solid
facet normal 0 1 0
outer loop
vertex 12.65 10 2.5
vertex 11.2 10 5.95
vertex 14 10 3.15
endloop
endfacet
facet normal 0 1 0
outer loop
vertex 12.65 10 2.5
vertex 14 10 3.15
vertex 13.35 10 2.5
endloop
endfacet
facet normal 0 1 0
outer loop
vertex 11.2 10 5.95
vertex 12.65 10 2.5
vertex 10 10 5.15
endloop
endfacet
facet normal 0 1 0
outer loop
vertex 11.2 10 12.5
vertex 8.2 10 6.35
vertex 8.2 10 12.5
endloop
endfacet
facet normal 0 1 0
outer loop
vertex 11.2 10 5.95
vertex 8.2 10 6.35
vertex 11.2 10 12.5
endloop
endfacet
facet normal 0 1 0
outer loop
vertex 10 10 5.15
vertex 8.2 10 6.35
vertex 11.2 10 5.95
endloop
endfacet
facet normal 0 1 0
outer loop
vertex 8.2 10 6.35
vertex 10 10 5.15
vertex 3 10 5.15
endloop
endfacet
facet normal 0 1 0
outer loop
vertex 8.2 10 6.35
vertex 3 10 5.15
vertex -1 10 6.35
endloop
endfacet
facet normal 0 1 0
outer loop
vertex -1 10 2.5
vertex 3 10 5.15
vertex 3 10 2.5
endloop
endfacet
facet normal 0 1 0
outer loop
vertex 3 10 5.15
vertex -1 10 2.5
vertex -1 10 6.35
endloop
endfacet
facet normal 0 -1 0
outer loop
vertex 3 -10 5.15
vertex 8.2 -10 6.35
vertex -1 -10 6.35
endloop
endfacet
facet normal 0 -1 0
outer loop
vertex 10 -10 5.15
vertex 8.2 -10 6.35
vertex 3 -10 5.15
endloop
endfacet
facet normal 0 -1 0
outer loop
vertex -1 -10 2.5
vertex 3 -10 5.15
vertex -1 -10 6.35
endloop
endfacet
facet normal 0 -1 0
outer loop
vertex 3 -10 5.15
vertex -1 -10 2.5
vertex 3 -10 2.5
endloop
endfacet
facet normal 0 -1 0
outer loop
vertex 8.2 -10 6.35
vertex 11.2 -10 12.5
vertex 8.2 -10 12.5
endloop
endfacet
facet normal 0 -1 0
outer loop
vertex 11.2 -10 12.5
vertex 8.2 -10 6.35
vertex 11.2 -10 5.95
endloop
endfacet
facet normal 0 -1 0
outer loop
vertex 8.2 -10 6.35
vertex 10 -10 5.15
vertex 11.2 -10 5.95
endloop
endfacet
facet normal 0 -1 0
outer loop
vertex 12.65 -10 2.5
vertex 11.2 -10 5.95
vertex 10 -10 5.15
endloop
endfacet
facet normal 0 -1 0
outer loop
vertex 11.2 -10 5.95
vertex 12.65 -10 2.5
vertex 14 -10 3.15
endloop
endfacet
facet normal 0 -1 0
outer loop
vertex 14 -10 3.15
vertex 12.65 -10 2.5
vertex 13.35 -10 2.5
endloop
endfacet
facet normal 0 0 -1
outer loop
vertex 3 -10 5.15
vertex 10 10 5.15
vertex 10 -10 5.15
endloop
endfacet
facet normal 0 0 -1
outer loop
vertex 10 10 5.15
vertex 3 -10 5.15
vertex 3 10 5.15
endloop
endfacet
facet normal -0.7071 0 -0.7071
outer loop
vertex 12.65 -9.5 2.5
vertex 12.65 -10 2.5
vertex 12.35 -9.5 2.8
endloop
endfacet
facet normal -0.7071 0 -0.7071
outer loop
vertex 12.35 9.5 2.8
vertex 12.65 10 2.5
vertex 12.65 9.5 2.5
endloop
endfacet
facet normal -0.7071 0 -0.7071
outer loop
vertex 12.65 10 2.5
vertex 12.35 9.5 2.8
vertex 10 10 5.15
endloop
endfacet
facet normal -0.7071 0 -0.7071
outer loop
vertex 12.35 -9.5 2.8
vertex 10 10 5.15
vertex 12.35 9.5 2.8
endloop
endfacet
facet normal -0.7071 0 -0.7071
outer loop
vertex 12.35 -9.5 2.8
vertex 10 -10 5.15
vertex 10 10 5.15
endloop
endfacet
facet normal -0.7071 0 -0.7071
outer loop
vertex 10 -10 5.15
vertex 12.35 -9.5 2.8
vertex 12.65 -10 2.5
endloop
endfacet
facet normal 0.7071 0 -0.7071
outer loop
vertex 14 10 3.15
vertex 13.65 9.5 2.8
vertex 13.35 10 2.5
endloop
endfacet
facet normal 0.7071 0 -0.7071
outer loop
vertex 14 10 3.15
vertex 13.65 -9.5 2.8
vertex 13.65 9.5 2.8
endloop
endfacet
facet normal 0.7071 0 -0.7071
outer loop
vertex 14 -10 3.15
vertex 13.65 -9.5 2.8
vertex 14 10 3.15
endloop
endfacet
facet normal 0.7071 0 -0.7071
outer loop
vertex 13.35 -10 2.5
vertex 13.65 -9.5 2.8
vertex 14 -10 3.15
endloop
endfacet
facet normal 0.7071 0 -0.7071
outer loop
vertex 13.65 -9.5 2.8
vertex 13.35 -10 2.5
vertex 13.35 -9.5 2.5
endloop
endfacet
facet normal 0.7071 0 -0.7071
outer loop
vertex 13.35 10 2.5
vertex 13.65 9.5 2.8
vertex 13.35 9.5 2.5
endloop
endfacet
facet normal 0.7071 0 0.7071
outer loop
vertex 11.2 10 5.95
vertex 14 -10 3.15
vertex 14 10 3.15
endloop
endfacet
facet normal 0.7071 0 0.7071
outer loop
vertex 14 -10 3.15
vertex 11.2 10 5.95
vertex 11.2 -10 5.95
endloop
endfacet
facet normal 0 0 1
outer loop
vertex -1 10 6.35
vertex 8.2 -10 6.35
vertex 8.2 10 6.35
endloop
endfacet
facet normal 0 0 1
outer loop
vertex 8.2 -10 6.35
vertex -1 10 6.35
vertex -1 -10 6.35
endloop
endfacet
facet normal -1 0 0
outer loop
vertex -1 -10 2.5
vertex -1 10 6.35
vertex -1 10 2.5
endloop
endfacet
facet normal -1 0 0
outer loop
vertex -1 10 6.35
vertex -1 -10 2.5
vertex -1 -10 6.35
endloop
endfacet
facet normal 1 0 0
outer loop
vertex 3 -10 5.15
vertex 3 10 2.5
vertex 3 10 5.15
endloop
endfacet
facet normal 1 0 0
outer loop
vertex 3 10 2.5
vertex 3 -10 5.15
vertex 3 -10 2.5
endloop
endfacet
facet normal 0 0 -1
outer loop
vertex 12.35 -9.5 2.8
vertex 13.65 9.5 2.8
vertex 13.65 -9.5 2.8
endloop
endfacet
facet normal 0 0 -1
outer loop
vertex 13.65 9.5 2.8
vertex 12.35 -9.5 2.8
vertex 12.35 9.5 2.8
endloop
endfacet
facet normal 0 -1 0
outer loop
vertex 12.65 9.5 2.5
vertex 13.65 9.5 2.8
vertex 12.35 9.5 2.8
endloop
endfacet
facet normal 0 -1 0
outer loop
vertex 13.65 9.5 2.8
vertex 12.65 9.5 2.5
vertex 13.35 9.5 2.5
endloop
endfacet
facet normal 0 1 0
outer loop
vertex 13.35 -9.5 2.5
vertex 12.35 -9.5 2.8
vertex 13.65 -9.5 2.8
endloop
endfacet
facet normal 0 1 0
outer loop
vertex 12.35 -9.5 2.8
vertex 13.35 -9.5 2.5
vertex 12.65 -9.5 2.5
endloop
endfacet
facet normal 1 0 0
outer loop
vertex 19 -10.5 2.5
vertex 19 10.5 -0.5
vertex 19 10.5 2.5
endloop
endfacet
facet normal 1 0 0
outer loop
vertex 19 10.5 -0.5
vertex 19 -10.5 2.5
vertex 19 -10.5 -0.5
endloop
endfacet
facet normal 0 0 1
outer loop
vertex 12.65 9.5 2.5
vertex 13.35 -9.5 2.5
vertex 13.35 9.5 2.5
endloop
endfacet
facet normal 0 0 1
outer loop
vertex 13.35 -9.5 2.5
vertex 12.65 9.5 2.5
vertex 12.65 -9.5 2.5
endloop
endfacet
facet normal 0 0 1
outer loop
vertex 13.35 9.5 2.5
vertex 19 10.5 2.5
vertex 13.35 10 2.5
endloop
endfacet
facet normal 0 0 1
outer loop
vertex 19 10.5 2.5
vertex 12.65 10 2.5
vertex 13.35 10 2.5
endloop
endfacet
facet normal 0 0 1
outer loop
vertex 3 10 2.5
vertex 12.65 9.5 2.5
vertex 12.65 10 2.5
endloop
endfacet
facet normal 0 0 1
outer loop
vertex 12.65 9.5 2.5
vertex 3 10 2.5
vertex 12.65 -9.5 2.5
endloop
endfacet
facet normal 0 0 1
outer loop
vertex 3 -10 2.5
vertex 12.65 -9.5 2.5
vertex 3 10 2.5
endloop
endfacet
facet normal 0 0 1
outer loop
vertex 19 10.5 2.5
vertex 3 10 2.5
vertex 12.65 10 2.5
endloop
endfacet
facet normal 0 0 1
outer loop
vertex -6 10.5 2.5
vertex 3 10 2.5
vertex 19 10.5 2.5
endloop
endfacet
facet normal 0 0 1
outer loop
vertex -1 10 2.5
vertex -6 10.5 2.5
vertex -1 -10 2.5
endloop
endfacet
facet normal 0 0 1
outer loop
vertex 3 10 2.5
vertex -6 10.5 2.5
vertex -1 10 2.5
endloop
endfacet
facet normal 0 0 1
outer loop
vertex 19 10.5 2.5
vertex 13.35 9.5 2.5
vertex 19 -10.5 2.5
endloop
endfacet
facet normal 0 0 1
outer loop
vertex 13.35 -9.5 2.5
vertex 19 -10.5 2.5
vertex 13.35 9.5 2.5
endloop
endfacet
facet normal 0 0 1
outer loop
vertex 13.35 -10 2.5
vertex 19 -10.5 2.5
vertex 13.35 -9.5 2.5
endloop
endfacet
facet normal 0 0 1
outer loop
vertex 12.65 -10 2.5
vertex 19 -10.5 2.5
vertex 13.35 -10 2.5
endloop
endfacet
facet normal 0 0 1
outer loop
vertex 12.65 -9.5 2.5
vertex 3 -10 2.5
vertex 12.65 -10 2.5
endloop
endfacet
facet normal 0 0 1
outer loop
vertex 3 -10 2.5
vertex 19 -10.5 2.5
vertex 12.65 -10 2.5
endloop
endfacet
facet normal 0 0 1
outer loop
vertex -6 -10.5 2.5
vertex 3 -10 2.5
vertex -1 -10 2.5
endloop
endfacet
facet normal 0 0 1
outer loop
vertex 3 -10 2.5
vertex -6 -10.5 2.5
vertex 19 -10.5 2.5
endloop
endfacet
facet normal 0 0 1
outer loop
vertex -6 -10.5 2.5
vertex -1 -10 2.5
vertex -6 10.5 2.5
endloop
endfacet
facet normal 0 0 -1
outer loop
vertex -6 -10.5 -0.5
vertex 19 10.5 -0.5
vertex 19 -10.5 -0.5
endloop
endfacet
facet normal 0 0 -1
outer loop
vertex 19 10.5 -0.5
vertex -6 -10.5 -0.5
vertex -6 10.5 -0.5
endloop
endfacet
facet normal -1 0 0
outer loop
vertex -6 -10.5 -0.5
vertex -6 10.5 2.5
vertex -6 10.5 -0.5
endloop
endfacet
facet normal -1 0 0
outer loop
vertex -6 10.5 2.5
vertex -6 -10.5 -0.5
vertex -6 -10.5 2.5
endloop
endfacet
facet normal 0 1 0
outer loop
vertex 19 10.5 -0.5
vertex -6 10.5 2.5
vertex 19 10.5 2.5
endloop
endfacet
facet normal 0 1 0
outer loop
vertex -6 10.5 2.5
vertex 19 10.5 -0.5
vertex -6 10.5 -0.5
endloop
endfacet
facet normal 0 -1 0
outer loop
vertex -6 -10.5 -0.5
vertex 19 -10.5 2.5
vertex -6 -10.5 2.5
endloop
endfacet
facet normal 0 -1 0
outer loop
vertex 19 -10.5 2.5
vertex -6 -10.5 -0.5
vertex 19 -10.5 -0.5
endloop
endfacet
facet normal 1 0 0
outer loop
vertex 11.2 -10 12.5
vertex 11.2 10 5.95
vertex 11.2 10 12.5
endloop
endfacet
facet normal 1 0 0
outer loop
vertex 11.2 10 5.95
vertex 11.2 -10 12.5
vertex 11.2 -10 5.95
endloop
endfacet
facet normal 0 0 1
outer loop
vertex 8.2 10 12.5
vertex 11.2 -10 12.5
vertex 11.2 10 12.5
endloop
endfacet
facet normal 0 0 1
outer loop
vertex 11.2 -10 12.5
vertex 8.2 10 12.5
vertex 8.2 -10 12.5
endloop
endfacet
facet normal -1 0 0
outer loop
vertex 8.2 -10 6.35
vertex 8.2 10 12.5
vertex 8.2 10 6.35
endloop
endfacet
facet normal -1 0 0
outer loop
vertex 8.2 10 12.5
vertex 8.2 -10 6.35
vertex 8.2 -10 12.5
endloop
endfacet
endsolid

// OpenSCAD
layerHeight = 0.2;
topLayers = 6;
width = 20;
length = 10;

translate([length/2+1.5, 0, 1]) cube([length+15, width+1, 3], center=true);
translate([length - 0.3, 0, 9]) cube([3, width, 7], center=true);

difference() {
    translate([0, width/2, 2.15]) rotate([90, 0, 0]) linear_extrude(width, convexity=2) polygon([
        [0, 0],
        [3, 0],
        [3, 3],
        [length, 3],
        [length+3, 0],
        [length+4, 1],
        [length+2-topLayers*layerHeight, 3+topLayers*layerHeight],
        [-1, 3+topLayers*layerHeight],
        [-1, 0],
    ]);
    translate([20, 0, 0]) cube([20, width-1, 5.6], center=true);
}

/*translate([-20, 0, 4]) cube([2, 10, 7], center=true);
translate([-15, 0, 7.01]) cube([10, 10, 1], center=true);
translate([-8, 0, 5]) rotate([0, 45, 0]) cube([5, 10, 1], center=true);*/
